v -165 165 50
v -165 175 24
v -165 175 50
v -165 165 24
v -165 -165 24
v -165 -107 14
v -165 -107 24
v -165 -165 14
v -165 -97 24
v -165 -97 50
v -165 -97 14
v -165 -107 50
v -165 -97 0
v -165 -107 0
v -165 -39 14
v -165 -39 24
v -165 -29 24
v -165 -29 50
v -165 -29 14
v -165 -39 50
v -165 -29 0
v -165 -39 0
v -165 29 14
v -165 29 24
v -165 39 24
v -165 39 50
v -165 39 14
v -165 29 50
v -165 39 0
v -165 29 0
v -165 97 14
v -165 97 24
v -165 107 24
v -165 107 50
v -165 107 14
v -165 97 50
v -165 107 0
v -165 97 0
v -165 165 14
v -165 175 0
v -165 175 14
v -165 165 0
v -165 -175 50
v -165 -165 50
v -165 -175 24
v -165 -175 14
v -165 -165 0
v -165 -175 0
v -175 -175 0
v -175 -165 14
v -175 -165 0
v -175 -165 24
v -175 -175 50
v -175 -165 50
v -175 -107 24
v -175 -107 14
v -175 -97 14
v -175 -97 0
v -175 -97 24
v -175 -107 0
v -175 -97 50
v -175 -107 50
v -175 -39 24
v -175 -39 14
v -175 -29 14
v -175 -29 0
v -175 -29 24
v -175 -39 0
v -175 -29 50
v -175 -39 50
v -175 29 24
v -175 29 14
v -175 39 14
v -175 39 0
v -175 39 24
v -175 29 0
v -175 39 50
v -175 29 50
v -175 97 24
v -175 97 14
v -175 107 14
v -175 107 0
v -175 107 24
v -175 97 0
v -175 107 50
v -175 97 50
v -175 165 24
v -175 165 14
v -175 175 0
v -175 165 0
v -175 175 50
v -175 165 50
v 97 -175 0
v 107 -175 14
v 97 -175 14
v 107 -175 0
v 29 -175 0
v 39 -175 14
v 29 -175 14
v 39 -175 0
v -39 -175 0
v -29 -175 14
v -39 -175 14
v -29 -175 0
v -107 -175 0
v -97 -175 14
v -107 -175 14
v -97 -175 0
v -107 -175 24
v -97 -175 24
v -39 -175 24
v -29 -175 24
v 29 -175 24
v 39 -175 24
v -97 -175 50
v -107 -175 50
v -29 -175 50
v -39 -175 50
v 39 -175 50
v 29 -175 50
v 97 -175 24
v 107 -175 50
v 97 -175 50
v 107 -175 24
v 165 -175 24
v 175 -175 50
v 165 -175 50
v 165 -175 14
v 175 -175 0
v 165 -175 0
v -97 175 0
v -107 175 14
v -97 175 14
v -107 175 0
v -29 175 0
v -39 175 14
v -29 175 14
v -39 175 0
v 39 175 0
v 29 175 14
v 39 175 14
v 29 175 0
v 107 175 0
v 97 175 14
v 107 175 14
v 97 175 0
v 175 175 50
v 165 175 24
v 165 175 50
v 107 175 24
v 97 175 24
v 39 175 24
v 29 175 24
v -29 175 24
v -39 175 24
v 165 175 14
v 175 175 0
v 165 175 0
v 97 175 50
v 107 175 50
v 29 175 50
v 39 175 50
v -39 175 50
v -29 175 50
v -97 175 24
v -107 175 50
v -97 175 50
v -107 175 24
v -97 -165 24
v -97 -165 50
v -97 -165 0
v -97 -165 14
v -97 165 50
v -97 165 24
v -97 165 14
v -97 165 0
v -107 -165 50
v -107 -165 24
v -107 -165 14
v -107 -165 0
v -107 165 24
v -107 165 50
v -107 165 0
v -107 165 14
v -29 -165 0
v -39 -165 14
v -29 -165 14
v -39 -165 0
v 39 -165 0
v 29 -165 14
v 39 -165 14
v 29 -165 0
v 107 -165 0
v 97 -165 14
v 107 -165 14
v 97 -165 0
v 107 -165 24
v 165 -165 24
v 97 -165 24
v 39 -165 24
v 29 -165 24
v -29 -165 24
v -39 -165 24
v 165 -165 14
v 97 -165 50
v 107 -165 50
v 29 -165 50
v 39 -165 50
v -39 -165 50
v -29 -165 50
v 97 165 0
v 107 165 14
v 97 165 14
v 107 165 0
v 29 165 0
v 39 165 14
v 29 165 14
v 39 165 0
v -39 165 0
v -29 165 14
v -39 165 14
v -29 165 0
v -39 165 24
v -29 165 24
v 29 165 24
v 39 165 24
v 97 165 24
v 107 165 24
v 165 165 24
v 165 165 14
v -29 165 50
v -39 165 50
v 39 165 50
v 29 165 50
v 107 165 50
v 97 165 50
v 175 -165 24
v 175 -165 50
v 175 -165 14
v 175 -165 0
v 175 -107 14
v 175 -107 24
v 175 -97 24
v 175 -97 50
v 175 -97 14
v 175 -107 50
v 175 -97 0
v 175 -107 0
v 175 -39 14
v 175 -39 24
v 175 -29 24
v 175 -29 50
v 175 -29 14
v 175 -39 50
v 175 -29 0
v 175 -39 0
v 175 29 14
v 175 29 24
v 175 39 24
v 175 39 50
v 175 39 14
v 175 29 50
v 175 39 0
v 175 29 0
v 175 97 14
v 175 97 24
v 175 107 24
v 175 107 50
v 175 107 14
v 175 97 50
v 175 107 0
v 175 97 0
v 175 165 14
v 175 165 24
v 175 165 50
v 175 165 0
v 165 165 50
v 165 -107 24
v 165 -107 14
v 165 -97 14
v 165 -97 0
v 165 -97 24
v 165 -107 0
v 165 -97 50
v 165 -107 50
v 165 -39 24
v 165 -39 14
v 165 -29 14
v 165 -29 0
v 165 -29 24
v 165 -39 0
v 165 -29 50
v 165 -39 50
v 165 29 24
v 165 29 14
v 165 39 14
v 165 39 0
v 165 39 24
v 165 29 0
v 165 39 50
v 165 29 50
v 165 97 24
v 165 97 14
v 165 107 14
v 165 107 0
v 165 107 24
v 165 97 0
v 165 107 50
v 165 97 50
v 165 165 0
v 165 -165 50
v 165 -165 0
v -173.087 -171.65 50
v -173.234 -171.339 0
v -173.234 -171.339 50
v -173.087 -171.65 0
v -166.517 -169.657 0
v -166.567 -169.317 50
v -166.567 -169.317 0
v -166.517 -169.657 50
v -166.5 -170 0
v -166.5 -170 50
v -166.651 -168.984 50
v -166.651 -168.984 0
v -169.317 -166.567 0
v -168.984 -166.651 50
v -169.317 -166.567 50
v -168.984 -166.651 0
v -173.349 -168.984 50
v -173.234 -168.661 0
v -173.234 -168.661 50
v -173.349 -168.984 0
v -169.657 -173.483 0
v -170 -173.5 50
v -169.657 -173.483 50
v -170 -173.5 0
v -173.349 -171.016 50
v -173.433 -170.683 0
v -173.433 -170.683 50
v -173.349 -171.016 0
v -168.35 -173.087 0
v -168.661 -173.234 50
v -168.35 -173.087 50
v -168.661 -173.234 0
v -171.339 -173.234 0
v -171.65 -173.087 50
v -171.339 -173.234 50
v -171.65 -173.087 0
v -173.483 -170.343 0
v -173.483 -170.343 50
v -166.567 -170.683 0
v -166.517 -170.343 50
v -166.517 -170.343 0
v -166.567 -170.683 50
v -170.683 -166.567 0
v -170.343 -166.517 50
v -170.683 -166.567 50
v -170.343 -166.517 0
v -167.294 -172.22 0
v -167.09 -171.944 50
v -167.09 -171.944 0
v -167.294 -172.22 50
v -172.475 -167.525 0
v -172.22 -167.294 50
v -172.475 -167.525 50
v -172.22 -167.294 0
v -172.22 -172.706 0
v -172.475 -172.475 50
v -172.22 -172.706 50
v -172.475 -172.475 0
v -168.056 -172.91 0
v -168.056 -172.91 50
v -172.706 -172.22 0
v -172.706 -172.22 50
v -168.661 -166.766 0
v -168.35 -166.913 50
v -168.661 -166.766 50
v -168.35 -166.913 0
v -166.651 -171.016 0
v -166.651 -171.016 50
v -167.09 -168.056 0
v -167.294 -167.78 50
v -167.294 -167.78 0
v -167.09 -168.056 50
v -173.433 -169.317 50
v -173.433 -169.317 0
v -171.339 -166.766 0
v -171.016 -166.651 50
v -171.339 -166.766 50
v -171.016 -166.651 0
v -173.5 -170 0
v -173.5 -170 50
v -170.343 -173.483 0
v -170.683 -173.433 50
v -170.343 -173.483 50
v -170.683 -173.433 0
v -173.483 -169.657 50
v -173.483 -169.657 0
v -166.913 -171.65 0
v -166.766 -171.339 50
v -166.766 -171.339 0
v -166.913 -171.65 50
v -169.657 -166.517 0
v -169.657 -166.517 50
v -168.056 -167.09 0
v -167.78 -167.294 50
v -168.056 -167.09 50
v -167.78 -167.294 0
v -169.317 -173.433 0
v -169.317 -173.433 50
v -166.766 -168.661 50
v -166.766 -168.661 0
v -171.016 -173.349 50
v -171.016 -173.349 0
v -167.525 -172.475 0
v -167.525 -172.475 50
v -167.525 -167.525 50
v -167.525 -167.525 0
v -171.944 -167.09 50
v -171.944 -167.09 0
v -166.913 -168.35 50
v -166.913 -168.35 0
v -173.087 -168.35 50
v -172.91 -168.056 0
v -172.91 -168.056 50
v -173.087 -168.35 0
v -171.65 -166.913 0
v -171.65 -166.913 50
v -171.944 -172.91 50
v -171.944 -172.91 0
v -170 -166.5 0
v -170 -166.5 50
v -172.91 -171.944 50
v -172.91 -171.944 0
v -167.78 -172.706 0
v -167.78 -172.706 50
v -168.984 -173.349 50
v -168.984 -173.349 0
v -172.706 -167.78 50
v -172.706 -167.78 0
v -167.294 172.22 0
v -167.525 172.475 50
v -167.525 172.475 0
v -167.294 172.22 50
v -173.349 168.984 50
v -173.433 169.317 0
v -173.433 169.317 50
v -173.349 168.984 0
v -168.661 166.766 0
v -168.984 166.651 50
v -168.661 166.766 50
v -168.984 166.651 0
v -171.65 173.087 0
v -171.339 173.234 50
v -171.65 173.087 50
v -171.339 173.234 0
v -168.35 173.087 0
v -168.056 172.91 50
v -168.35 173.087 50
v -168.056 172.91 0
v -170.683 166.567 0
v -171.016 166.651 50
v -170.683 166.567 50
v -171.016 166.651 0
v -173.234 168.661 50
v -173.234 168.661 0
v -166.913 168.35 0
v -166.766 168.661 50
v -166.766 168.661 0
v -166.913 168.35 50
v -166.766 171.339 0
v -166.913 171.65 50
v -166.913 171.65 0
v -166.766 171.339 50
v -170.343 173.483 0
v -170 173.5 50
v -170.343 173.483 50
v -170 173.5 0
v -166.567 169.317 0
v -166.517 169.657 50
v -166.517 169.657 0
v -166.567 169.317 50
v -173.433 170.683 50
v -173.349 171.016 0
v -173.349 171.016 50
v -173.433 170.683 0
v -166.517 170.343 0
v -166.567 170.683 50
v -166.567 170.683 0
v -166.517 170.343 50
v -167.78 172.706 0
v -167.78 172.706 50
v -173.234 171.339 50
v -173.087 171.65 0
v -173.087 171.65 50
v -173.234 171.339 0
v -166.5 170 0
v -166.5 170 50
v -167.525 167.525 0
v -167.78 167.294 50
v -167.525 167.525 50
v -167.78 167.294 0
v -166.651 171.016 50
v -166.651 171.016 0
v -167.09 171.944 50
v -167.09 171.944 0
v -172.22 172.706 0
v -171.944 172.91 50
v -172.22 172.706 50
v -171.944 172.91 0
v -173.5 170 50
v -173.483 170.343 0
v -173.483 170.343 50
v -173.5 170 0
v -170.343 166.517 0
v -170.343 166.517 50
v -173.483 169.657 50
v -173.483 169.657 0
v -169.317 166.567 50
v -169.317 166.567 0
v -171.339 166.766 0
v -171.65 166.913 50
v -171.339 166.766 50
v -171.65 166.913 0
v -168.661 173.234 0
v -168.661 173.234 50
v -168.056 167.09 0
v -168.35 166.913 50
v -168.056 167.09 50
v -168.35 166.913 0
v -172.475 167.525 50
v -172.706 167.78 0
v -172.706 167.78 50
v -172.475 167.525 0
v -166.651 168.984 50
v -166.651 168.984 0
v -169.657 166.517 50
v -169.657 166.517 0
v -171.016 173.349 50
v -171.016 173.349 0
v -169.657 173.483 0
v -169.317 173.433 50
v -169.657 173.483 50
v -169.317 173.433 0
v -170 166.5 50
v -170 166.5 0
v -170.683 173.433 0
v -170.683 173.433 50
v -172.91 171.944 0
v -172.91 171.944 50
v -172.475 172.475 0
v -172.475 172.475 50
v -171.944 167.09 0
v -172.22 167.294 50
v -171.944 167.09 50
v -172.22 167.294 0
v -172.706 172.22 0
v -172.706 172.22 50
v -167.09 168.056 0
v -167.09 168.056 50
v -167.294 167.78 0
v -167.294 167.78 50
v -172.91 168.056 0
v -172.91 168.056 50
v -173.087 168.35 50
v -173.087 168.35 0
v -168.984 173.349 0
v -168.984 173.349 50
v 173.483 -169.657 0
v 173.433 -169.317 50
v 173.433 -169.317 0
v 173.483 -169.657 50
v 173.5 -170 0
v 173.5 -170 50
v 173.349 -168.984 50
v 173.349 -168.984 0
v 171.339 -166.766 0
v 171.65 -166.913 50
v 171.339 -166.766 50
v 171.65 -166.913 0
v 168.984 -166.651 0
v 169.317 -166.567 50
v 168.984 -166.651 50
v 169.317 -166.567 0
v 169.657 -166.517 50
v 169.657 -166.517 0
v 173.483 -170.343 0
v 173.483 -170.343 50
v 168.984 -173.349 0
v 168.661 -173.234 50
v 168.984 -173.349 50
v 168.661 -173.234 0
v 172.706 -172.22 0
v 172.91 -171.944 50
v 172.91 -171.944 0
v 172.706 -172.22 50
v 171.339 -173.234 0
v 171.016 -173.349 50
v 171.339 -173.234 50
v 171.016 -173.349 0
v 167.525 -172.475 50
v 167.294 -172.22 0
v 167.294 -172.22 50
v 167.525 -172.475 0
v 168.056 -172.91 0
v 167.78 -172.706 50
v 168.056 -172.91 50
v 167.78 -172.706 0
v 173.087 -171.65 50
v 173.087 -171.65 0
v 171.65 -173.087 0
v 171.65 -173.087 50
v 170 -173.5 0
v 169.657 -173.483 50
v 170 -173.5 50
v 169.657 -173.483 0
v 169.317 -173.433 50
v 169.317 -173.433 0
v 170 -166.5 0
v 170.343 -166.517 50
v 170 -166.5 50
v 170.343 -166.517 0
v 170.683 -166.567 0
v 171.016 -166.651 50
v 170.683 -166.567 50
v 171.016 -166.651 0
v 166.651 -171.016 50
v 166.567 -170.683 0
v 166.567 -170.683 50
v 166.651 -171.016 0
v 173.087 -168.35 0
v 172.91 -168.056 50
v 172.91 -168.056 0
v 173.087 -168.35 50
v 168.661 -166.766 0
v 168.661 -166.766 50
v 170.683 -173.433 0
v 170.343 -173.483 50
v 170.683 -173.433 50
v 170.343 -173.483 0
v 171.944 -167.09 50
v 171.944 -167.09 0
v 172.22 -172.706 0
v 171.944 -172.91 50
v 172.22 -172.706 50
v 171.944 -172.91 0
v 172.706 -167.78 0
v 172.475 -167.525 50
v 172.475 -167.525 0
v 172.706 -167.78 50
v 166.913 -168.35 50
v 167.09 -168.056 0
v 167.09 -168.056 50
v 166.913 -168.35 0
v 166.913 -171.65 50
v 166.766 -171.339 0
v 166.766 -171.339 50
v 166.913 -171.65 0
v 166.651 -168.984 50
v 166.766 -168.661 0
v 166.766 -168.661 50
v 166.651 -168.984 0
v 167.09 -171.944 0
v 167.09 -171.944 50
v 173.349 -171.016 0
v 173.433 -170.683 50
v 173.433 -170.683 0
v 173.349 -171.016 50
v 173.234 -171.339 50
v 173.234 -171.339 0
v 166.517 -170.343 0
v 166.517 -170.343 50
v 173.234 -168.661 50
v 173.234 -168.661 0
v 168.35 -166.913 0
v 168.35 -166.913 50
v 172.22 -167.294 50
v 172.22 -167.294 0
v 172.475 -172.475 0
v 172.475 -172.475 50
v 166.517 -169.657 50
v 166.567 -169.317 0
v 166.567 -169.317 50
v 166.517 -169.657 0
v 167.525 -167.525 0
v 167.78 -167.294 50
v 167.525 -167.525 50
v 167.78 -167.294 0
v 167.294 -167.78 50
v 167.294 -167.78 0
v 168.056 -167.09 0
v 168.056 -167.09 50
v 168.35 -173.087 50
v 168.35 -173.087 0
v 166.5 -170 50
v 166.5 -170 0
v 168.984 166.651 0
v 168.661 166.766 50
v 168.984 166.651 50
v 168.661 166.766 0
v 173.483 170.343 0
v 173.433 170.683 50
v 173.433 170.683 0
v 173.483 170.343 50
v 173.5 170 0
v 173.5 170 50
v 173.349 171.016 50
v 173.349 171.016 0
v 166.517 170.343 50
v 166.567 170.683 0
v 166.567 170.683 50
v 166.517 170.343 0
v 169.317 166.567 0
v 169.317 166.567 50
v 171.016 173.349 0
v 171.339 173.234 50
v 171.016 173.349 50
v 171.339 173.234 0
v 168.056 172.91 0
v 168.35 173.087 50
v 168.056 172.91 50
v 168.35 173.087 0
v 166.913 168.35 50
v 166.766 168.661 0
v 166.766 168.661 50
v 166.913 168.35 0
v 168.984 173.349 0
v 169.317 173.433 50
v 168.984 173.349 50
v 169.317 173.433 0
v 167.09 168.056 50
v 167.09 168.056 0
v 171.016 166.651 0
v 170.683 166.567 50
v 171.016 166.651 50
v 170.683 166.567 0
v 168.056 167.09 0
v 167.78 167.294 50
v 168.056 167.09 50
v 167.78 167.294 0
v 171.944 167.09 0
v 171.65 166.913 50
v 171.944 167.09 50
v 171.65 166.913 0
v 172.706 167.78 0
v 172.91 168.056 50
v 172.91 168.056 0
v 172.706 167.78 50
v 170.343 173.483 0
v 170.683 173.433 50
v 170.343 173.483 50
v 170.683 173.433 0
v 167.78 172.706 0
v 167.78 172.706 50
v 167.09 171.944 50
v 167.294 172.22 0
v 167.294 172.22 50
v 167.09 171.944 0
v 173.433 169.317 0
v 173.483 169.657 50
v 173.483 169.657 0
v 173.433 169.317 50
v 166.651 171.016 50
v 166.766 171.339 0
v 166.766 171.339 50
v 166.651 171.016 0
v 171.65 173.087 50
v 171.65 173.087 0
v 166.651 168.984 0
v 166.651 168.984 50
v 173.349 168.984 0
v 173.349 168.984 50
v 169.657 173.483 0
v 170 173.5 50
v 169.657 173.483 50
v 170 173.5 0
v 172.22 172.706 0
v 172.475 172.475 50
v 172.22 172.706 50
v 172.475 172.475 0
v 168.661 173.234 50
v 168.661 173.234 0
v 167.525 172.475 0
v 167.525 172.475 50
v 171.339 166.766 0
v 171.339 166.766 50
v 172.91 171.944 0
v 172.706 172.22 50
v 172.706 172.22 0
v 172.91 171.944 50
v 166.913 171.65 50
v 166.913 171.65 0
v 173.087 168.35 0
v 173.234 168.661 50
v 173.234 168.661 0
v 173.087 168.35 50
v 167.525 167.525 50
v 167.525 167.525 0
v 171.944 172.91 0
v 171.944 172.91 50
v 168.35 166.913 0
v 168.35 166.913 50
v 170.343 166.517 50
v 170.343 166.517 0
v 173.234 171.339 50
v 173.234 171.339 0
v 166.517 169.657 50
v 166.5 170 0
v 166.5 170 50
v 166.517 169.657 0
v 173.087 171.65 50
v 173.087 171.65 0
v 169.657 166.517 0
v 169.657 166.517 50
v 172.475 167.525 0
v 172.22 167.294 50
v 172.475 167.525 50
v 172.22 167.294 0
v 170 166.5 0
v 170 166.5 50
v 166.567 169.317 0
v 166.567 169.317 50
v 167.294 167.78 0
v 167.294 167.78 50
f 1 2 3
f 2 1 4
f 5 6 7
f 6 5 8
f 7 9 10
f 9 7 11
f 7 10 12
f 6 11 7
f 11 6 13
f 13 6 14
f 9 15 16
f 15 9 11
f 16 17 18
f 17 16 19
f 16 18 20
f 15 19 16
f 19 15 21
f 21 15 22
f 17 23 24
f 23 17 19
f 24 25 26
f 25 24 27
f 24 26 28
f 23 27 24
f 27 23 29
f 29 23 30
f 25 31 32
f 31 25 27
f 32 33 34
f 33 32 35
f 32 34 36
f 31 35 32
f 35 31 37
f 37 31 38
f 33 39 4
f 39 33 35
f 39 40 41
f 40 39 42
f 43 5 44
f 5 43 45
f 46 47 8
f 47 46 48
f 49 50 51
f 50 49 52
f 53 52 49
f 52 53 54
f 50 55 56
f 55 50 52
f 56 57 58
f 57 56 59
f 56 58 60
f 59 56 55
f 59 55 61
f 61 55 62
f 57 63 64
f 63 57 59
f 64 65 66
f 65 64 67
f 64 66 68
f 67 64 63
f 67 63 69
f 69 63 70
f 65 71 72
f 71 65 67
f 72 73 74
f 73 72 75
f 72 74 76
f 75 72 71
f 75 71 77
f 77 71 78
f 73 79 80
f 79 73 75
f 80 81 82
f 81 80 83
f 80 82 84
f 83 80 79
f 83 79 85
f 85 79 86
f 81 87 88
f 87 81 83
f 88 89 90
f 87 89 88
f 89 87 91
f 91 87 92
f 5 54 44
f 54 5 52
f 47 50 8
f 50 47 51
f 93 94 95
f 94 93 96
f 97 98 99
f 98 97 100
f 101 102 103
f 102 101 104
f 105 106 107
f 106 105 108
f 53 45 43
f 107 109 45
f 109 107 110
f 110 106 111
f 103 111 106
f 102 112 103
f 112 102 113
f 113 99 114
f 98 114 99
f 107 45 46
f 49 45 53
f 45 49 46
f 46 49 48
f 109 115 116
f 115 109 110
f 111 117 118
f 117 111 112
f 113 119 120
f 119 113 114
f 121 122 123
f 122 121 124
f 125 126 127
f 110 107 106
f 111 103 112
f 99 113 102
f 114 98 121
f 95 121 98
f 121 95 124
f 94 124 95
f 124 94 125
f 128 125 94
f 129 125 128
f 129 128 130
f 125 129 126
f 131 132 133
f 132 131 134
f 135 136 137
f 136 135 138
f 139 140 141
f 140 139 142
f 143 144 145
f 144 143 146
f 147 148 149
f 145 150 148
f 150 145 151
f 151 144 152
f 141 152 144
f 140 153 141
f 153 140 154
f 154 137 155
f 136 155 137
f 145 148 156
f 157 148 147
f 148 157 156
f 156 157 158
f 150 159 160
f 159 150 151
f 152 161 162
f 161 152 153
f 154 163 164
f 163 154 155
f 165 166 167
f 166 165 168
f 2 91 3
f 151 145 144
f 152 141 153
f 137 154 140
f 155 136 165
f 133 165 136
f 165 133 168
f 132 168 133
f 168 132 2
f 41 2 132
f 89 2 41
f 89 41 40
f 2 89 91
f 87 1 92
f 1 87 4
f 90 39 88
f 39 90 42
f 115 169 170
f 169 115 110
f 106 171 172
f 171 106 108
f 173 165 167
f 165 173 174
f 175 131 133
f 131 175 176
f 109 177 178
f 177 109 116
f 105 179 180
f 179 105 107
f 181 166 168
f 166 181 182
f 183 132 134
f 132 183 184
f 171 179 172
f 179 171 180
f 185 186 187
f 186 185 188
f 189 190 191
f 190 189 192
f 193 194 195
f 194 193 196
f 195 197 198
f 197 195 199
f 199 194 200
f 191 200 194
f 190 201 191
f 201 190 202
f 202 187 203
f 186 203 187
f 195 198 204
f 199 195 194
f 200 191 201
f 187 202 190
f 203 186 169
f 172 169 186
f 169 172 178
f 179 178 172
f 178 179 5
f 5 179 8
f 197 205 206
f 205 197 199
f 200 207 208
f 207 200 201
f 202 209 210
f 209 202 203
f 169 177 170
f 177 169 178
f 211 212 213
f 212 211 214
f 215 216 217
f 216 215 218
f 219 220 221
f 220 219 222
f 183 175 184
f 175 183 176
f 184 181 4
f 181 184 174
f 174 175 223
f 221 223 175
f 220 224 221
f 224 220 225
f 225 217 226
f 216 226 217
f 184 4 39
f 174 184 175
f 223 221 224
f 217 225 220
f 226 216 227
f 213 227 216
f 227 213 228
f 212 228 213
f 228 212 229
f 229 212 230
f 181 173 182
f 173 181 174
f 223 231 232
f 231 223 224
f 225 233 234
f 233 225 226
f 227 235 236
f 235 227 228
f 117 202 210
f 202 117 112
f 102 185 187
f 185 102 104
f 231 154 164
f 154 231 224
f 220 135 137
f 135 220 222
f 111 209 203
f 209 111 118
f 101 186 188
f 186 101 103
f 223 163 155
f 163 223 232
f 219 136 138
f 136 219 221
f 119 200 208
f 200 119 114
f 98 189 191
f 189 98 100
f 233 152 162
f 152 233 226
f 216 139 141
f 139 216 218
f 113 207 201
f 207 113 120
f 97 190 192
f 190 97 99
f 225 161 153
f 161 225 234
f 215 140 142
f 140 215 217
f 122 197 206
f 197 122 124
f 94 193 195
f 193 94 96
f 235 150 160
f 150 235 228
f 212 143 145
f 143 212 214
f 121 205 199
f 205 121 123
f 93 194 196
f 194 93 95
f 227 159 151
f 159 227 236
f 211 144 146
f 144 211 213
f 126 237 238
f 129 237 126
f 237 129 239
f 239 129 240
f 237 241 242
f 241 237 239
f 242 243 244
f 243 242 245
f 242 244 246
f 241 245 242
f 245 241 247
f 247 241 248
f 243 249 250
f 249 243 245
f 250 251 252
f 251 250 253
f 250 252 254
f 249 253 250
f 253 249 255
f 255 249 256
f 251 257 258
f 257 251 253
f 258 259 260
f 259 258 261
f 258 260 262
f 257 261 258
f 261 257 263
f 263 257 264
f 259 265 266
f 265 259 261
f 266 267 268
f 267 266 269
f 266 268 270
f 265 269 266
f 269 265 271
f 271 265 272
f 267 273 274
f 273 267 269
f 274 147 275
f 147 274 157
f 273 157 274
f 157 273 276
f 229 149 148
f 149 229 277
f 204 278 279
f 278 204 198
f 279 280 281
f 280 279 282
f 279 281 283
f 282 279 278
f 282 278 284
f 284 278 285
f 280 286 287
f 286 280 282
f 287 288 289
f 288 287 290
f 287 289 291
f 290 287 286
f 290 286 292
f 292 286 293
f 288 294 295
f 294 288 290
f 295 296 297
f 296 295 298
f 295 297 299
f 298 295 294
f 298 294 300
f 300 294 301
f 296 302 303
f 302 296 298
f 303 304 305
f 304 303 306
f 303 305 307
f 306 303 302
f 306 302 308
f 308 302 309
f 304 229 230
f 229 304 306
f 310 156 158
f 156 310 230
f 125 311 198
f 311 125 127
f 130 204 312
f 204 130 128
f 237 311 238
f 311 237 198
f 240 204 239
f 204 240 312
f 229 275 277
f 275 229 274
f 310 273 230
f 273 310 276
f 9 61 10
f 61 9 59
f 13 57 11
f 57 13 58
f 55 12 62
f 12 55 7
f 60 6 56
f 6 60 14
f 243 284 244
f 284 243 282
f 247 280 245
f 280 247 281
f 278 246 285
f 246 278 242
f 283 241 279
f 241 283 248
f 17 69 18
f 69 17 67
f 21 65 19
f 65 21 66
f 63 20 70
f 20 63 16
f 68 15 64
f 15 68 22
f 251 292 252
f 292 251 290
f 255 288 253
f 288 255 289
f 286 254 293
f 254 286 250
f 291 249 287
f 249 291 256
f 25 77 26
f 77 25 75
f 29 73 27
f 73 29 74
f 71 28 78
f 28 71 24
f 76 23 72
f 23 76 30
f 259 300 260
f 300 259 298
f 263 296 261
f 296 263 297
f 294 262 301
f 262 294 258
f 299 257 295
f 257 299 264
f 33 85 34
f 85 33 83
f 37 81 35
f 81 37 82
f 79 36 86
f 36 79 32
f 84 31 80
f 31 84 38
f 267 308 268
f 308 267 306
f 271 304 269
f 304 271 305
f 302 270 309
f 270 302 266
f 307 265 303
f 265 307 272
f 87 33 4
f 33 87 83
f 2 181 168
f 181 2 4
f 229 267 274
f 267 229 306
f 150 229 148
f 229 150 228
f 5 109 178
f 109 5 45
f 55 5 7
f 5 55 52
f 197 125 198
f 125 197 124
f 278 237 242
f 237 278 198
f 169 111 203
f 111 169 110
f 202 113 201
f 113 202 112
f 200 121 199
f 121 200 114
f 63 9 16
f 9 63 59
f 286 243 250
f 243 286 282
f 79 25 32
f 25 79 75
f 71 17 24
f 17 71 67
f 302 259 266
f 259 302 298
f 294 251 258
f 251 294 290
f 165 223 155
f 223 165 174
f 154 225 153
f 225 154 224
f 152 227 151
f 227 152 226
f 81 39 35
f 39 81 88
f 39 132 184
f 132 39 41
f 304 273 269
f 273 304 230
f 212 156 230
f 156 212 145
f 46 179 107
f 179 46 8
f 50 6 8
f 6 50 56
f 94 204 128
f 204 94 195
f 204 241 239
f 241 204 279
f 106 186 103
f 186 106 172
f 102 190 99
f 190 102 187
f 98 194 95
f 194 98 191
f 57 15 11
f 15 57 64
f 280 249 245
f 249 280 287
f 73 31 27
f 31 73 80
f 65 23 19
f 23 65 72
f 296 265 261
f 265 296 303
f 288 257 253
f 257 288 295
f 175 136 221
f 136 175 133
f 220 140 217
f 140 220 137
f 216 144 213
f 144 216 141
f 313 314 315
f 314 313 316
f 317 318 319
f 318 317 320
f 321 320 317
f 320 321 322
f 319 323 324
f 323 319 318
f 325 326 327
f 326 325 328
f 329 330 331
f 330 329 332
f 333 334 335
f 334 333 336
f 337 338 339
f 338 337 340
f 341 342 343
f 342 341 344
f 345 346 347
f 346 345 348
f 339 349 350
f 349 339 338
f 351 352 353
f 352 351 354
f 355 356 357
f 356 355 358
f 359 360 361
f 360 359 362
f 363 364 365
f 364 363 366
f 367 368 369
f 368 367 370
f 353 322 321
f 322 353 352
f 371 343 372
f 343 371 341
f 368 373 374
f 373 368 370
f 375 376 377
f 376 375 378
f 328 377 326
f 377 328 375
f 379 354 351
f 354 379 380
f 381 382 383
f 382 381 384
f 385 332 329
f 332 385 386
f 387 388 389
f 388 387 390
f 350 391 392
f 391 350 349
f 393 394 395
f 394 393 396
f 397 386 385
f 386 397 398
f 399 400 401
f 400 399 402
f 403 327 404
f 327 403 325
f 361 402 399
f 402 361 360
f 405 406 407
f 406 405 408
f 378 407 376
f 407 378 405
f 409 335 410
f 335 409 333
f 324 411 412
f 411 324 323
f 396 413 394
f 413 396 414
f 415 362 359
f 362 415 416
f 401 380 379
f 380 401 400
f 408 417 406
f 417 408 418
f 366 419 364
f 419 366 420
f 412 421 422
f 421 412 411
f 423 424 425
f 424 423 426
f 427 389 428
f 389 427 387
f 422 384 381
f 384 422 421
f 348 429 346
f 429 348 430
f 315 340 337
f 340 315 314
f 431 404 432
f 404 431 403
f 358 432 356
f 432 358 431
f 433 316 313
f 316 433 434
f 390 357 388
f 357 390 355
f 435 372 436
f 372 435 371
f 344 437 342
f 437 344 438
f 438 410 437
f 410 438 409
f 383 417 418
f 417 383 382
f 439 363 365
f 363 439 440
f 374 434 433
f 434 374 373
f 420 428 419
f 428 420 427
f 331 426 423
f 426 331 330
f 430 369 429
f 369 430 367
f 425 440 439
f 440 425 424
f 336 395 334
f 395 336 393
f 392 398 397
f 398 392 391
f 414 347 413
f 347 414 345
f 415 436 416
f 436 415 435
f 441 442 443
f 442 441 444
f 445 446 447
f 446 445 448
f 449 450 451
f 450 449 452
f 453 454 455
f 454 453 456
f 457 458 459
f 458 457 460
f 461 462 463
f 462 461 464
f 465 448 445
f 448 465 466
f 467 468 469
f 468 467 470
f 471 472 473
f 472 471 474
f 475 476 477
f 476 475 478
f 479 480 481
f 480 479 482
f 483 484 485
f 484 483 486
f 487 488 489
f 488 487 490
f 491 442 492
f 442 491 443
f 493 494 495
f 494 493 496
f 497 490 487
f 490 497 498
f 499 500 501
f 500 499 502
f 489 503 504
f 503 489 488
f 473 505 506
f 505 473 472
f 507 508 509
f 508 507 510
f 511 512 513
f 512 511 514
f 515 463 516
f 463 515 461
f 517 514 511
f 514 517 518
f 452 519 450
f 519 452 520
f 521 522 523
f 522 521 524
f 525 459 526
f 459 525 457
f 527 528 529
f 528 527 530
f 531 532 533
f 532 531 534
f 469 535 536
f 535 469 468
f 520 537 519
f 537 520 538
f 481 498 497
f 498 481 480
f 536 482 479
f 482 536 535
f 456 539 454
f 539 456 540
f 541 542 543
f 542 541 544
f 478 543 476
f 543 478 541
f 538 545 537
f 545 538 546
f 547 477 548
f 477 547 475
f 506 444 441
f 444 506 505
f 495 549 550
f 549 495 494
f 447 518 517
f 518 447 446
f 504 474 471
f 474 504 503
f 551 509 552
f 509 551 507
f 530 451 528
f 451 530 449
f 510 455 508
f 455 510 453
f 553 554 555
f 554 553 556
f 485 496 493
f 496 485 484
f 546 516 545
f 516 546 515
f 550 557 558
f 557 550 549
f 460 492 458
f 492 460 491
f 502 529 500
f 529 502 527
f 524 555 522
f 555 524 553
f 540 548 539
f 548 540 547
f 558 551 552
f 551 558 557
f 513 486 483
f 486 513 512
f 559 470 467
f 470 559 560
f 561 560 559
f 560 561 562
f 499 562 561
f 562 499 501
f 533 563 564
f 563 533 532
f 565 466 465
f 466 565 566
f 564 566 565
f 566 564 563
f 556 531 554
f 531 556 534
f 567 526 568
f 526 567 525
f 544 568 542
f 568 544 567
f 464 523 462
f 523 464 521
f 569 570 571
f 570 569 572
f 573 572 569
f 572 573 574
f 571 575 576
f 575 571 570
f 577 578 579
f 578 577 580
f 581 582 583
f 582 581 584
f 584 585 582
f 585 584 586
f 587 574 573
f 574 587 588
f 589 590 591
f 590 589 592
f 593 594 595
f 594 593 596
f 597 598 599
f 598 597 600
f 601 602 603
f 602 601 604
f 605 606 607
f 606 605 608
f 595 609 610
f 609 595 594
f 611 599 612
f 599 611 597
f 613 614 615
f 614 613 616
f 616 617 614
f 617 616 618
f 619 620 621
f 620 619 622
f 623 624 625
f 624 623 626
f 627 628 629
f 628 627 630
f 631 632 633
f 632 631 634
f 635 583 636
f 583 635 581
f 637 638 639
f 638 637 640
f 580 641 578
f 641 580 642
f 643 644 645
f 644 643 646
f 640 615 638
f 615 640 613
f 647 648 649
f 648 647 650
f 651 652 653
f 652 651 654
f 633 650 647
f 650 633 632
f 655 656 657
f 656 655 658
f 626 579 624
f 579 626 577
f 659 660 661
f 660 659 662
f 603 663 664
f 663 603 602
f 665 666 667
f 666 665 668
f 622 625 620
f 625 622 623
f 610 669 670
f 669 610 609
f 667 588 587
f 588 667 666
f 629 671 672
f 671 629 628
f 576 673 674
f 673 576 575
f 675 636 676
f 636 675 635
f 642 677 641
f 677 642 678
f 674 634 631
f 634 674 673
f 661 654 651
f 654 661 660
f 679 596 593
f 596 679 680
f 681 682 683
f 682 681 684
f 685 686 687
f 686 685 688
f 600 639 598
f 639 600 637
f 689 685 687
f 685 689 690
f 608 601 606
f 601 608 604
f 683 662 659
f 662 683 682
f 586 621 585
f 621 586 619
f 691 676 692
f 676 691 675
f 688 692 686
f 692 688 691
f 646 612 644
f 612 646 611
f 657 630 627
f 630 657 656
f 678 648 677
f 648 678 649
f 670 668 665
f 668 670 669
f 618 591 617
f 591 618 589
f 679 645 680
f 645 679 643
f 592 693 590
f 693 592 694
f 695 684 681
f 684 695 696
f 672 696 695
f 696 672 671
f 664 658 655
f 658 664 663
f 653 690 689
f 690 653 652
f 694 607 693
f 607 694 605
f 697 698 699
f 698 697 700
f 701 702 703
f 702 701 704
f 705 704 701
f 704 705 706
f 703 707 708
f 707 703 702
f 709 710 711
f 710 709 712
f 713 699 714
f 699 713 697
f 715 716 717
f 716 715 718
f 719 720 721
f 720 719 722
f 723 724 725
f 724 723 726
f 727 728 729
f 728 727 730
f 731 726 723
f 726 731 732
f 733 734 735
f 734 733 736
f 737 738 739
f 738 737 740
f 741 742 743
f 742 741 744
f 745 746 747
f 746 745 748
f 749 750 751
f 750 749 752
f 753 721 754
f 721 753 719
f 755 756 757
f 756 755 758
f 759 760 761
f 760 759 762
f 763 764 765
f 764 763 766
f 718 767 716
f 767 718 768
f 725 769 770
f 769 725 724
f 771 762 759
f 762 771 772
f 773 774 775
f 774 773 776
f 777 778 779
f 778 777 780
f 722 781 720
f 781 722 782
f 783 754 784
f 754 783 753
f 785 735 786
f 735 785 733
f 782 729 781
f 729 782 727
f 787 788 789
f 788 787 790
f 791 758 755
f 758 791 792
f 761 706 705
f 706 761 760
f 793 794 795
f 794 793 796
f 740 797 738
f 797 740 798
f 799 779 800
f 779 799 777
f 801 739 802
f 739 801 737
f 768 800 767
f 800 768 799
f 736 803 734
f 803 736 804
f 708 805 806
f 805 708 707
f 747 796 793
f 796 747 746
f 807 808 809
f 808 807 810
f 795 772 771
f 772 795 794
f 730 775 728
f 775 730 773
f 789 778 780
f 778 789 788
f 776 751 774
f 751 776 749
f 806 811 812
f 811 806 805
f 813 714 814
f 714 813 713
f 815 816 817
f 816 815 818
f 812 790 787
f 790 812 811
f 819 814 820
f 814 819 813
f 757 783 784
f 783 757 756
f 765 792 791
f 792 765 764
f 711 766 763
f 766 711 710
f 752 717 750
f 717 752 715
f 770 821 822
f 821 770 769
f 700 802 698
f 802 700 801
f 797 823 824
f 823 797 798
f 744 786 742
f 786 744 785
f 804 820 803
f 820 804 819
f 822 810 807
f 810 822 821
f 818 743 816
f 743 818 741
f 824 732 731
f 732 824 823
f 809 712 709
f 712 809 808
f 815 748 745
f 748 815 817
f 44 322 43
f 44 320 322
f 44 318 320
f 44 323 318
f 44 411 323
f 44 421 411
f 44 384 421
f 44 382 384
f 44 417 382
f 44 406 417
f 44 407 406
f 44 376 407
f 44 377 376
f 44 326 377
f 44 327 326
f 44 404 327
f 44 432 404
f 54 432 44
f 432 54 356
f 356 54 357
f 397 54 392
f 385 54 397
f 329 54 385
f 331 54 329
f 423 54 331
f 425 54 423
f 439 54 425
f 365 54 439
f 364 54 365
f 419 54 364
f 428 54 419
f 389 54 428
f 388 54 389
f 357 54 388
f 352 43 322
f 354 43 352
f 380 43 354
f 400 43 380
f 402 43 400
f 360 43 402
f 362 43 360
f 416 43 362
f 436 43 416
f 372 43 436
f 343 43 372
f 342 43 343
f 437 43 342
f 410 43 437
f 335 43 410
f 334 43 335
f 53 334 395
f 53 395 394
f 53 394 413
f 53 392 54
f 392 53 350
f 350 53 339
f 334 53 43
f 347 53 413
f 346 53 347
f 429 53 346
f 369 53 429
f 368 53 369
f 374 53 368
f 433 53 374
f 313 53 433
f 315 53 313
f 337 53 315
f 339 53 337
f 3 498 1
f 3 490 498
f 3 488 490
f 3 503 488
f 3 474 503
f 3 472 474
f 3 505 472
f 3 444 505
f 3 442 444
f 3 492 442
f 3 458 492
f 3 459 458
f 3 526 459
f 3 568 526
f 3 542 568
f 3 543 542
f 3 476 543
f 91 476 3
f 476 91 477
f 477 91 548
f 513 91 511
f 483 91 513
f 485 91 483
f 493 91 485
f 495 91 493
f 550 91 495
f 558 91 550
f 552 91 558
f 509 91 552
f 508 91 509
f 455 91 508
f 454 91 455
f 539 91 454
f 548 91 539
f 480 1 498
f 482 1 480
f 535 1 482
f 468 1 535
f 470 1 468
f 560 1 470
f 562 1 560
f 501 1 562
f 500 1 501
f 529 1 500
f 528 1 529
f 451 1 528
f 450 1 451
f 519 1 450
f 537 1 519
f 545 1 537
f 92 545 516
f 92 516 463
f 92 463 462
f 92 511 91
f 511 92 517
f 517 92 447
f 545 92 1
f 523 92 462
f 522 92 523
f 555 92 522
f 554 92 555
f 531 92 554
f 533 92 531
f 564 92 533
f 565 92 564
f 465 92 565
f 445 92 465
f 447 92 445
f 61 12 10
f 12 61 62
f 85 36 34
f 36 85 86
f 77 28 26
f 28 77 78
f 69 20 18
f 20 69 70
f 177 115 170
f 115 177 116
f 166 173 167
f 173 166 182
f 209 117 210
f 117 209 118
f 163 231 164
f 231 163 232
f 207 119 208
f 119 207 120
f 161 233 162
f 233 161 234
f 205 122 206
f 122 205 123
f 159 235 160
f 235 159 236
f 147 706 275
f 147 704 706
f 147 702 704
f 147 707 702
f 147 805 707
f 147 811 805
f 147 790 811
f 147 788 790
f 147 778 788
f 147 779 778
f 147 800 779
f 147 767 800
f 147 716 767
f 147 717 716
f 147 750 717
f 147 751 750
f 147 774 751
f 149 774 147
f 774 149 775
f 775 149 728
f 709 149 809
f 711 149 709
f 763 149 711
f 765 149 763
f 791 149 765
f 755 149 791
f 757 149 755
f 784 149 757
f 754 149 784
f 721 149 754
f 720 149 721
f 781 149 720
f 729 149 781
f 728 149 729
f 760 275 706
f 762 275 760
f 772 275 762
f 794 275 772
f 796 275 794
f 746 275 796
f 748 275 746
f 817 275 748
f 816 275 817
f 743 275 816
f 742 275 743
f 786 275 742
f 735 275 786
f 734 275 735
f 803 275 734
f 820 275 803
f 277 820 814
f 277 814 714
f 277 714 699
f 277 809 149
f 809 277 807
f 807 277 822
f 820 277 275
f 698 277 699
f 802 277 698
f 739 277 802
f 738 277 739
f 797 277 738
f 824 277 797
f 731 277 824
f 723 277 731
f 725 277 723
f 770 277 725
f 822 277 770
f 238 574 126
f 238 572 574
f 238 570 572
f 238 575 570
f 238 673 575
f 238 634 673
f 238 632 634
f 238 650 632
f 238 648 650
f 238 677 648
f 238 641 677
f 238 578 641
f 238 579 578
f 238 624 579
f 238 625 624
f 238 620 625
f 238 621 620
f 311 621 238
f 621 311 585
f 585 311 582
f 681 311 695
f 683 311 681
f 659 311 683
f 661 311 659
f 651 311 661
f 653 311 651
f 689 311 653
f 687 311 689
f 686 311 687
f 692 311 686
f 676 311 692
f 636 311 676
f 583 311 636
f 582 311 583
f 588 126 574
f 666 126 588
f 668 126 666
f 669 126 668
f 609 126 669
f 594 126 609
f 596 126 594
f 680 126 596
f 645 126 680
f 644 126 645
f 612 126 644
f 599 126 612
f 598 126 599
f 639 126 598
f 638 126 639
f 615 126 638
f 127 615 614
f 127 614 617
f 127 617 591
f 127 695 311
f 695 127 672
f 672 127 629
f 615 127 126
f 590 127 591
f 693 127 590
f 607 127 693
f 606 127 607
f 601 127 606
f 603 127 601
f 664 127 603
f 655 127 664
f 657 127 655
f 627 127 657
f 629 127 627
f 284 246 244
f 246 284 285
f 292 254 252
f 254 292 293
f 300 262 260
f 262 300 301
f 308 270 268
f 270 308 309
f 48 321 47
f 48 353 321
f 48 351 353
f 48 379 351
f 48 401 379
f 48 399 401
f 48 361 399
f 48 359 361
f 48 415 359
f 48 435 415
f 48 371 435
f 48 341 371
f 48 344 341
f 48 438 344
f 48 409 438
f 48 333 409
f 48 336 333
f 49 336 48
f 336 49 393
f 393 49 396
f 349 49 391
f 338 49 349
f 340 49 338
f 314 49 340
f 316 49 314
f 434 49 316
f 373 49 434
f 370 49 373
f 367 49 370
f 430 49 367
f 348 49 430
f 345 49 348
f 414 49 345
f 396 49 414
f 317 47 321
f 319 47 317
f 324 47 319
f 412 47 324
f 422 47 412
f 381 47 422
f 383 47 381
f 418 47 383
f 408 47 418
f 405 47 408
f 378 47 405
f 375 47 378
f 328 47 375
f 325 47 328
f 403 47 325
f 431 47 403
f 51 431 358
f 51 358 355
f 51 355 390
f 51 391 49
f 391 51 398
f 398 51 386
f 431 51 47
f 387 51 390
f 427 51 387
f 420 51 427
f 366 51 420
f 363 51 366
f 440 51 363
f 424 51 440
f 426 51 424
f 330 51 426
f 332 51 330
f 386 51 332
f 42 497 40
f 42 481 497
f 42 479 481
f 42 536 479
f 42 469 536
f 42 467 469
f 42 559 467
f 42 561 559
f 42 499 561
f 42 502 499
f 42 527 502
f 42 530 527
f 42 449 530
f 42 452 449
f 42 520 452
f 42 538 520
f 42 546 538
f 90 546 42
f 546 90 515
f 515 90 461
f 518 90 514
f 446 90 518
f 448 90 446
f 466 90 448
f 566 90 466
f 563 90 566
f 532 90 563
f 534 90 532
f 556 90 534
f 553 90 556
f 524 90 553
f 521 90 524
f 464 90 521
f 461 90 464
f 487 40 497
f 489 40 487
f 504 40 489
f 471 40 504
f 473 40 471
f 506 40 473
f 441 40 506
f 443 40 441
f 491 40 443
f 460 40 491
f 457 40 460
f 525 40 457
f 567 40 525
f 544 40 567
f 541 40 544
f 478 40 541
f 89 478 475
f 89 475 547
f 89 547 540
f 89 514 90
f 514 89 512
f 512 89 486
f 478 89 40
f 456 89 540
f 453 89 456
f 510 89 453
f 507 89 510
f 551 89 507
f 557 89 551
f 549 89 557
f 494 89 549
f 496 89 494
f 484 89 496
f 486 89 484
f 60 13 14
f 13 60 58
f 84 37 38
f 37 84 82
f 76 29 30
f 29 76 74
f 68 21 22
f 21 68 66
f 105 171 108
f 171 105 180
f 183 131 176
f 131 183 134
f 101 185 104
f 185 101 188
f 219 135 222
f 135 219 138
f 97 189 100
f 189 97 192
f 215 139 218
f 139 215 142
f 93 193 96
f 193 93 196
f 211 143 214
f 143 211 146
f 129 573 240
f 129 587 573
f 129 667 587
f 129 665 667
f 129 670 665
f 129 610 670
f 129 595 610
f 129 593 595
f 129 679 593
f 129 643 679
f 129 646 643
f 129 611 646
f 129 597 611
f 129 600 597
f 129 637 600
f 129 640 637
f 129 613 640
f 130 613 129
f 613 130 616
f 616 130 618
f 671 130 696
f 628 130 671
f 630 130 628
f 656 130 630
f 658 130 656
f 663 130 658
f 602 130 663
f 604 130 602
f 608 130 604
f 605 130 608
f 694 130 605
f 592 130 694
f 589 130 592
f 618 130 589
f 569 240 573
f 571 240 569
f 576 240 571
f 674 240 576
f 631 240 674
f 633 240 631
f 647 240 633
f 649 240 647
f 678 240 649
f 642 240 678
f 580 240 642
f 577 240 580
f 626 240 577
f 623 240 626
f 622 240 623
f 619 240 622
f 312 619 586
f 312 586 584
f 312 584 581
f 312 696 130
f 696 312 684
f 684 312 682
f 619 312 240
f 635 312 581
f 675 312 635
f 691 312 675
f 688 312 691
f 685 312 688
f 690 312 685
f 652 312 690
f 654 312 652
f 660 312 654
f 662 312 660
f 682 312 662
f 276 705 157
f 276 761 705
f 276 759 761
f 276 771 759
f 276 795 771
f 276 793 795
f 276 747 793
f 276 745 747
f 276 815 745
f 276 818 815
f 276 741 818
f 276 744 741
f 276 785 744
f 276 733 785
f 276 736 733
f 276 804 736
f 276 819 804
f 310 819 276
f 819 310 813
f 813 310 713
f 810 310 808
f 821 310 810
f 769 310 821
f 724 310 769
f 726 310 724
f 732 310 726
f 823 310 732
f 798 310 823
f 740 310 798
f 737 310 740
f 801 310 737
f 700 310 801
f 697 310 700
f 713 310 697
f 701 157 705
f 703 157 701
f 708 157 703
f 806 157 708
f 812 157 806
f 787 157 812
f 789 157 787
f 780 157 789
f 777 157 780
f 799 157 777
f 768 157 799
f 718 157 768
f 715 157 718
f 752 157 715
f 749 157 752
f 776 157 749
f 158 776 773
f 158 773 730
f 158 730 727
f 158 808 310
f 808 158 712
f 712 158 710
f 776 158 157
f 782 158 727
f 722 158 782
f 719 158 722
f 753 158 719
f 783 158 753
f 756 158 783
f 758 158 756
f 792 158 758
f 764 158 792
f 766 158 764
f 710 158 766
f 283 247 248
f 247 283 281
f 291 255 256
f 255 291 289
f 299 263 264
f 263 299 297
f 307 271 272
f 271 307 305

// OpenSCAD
// Cage slice - index 8
bar = 10;
outer = 350;
half = outer / 2;
height = 700;

N_xy = 6;
N_z  = 11;

x_spacing = (outer - bar) / (N_xy - 1);
z_spacing = (height - bar) / (N_z  - 1);

xs = [ for (i = [0 : N_xy - 1]) (-half + bar/2 + i * x_spacing) ];
ys = xs;

zs = [ for (k = [0 : N_z - 1]) (bar/2 + k * z_spacing) ];

$fn = 64;

module cage_bars() {
    union() {
        // Vertical bars on front and back faces
        for (xv = xs) {
            translate([xv, -half + bar/2, height/2])
                cube([bar, bar, height], center = true);
            translate([xv,  half - bar/2, height/2])
                cube([bar, bar, height], center = true);
        }

        // Vertical bars on left and right faces
        for (yv = ys) {
            translate([-half + bar/2, yv, height/2])
                cube([bar, bar, height], center = true);
            translate([ half - bar/2, yv, height/2])
                cube([bar, bar, height], center = true);
        }

        // Horizontal x-bars on front and back faces
        for (zv = zs) {
            translate([0, -half + bar/2, zv])
                cube([outer, bar, bar], center = true);
            translate([0,  half - bar/2, zv])
                cube([outer, bar, bar], center = true);
        }

        // Horizontal y-bars on left and right faces
        for (zv = zs) {
            translate([-half + bar/2, 0, zv])
                cube([bar, outer, bar], center = true);
            translate([ half - bar/2, 0, zv])
                cube([bar, outer, bar], center = true);
        }

        // Floor and ceiling extra x-bars at all y positions
        z_floor = bar/2;
        z_ceil  = height - bar/2;
        for (yv = ys) {
            translate([0, yv, z_floor])
                cube([outer, bar, bar], center = true);
            translate([0, yv, z_ceil])
                cube([outer, bar, bar], center = true);
        }

        // Floor and ceiling extra y-bars at all x positions
        for (xv = xs) {
            translate([xv, 0, z_floor])
                cube([bar, outer, bar], center = true);
            translate([xv, 0, z_ceil])
                cube([bar, outer, bar], center = true);
        }
    }
}

module corner_holes() {
    hole_d = 7;
    for (sx = [-1, 1])
        for (sy = [-1, 1])
            translate([sx * (half - bar/2), sy * (half - bar/2), height/2])
                cylinder(h = height + 2, d = hole_d, center = true);
}

module cage_full() {
    difference() {
        cage_bars();
        corner_holes();
    }
}

slice_index = 8;
slice_height = 50;

module cage_slice() {
    translate([0, 0, -slice_index * slice_height]) {
        intersection() {
            cage_full();
            translate([0, 0, slice_index * slice_height + slice_height/2])
                cube([outer + 20, outer + 20, slice_height], center = true);
        }
    }
}

cage_slice();
